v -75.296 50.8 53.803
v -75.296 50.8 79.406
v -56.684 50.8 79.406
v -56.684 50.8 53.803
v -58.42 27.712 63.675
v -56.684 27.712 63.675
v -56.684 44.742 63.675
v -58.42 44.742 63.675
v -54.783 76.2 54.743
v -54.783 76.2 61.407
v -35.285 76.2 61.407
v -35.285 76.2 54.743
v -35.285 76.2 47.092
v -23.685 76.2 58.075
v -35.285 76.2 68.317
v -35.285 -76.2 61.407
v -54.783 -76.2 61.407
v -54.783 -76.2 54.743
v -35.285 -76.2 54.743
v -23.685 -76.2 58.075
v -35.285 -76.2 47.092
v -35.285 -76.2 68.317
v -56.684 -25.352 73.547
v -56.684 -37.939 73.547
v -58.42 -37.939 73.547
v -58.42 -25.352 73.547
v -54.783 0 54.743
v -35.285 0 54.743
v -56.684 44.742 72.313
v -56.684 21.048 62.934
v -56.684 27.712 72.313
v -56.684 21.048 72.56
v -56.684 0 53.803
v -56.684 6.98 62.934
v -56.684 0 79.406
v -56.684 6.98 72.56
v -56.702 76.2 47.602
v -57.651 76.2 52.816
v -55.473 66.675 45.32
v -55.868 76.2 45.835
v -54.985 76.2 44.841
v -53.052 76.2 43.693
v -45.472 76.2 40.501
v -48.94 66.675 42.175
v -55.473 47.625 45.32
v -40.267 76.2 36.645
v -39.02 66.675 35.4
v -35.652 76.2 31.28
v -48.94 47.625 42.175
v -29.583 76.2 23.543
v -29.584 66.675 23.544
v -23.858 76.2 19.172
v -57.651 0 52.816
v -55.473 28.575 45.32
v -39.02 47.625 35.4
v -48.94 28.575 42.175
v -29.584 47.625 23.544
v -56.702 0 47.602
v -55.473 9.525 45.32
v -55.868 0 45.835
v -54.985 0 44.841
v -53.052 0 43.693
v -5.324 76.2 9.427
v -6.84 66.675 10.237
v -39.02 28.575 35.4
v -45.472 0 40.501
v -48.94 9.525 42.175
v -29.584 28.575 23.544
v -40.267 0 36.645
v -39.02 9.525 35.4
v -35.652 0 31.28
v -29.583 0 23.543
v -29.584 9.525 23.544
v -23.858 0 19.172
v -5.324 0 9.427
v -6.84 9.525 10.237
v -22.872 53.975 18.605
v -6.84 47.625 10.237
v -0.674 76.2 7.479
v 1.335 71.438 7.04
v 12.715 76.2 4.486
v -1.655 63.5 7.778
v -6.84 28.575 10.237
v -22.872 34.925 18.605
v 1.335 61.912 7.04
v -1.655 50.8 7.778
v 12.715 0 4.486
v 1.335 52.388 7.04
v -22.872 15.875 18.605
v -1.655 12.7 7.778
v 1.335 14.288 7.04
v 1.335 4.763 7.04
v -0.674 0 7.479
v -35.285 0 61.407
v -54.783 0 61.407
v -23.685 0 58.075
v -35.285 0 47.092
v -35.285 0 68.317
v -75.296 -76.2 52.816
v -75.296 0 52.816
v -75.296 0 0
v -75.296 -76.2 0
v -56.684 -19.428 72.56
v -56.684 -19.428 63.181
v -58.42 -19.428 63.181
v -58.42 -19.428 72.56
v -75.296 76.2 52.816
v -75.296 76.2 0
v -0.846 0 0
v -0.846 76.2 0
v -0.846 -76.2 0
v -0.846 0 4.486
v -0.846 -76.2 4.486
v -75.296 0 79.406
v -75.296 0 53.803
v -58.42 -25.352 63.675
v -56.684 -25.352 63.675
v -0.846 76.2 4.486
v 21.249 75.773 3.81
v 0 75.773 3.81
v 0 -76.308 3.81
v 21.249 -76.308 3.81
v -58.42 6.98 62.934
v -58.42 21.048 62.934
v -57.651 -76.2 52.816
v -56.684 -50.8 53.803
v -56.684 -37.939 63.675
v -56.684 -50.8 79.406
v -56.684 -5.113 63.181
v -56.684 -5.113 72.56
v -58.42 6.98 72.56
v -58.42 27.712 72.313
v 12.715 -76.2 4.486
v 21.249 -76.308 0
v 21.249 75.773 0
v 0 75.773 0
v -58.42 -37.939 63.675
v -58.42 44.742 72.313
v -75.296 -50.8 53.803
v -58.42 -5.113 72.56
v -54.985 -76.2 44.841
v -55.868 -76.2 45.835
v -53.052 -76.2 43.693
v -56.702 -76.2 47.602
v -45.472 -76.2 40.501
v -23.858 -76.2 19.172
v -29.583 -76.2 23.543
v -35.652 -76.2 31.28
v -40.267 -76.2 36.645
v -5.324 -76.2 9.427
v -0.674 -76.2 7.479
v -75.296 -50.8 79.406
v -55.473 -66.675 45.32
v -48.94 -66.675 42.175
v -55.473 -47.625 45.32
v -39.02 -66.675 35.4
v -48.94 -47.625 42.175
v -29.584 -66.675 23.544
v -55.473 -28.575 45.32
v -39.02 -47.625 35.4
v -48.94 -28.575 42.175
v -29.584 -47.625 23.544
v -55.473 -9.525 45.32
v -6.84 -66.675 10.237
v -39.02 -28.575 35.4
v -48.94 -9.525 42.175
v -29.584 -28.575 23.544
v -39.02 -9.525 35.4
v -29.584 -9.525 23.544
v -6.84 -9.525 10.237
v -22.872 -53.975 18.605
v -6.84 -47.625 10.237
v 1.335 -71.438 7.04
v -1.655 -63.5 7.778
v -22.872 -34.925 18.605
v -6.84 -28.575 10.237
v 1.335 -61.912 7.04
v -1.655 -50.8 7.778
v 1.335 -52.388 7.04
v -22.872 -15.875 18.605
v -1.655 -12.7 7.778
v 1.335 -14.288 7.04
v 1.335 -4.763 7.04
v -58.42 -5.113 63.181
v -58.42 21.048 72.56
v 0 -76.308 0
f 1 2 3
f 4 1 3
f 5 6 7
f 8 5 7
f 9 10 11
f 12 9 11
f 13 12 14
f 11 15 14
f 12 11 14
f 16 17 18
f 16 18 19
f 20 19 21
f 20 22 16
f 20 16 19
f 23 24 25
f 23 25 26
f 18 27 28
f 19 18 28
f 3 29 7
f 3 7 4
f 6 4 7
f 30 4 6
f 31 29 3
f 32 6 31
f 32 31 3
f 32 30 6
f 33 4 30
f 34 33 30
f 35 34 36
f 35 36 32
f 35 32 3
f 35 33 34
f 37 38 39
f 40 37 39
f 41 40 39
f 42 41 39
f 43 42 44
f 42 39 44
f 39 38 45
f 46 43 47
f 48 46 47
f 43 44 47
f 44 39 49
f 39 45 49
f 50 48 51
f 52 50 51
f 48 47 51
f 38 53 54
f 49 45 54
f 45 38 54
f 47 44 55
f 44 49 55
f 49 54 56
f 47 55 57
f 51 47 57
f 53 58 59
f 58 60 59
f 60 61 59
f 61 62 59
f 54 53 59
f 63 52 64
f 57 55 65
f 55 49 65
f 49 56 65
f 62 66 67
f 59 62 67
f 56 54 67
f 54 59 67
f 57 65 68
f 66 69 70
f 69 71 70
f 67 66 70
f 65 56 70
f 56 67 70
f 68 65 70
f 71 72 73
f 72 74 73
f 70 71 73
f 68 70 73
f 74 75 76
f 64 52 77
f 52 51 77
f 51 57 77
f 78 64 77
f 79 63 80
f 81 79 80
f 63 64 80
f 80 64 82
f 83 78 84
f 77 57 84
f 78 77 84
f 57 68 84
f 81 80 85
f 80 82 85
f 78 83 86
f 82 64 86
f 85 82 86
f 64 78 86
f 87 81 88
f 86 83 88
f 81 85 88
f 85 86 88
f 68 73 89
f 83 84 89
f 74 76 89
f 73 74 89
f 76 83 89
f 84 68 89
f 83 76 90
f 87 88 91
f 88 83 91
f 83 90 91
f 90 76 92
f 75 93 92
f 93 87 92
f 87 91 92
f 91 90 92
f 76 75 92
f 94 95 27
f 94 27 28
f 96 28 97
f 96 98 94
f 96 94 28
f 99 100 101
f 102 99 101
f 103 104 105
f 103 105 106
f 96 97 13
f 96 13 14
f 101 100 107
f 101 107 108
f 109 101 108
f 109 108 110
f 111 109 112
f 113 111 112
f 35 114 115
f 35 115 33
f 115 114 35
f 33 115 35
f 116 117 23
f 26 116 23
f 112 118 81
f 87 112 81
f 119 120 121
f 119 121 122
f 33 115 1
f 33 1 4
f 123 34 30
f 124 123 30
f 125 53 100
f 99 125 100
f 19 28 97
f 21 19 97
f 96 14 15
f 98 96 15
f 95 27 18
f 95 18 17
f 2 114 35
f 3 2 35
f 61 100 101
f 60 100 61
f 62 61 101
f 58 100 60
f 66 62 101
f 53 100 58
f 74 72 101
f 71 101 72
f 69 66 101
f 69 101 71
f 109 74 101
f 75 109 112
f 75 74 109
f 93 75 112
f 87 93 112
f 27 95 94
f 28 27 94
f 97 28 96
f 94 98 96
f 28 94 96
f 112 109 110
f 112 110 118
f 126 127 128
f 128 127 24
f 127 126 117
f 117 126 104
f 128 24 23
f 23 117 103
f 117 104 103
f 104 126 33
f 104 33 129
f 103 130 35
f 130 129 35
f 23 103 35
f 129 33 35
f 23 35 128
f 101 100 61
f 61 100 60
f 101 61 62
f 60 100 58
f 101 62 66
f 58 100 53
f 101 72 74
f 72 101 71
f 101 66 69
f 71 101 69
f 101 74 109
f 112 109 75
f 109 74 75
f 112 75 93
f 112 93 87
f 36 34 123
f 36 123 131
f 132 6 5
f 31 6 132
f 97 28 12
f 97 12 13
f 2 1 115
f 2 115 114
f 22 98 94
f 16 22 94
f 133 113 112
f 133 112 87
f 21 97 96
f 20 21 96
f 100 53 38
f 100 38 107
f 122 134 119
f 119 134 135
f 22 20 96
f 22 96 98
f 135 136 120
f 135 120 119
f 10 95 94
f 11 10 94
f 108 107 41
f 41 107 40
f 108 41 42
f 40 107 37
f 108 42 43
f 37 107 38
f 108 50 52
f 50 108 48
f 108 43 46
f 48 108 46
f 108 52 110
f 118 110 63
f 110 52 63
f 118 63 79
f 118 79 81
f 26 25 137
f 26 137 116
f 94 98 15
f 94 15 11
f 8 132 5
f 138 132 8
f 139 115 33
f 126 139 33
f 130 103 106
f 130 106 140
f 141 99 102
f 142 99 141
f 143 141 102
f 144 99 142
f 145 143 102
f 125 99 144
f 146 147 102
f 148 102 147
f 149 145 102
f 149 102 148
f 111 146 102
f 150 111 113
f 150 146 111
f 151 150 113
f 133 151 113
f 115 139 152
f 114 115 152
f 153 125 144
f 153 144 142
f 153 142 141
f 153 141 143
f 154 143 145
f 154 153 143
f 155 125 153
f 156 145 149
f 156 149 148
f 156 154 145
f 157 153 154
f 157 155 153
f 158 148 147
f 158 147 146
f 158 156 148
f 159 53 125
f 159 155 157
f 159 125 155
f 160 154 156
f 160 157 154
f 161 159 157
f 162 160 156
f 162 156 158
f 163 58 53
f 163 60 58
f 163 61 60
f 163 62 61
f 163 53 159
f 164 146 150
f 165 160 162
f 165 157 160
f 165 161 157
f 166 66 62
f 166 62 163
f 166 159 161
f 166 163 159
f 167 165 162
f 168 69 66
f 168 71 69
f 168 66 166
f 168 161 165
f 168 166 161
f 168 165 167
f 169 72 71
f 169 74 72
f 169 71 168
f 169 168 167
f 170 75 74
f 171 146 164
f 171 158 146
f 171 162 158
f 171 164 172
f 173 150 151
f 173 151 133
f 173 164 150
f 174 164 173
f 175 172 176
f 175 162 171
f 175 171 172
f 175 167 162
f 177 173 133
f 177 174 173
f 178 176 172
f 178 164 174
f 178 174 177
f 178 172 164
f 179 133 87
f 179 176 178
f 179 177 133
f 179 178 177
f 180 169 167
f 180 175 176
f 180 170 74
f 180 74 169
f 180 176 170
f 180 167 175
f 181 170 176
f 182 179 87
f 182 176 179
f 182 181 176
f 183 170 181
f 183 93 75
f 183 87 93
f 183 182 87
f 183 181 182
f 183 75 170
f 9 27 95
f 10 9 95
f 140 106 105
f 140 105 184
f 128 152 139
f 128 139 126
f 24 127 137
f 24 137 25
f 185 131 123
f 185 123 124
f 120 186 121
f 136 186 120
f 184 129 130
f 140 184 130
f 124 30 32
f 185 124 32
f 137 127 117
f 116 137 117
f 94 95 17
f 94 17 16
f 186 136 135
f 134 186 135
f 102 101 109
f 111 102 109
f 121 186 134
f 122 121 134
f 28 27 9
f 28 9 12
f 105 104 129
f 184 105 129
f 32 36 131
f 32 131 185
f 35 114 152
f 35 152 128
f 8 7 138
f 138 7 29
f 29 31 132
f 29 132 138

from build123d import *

# Parameters (mm, degrees)
F0_W     = 21.2485753
F0_H     = 152.0810052752
F1_DEPTH = 3.81
F3_DEPTH = 76.2
F2_W     = 19.4977223873
F2_H     = 6.6637769341
F4_DEPTH = 76.2
F5_W     = 18.6125934124
F5_H     = 25.6022065878
F6_DEPTH = 50.8
F7_DEPTH = 50.8
F8_W     = 14.3147837371
F8_H     = 9.378656745
F8_W_2   = 14.0679730102
F8_H_2   = 9.6254572272
F8_W_3   = 12.587139383
F8_H_3   = 9.8722651601
F8_W_4   = 17.029652372
F8_H_4   = 8.6382329464
F9_DEPTH = 58.42


with BuildPart() as f1:
    # F0 (on Top) → F1 (new body)
    with BuildSketch(Plane.XY):
        with Locations((10.62428765, -0.267278403)):
            Rectangle(F0_W, F0_H)
    extrude(amount=F1_DEPTH)


with BuildPart() as f3:
    # F2 (on Front) → F3 (new body)
    with BuildSketch(Plane.XZ):
        with BuildLine():
            Line((-57.6507113874, 52.8162680566), (-75.2964168787, 52.8162680566))
            Line((-75.2964168787, 52.8162680566), (-75.2964168787, 0))
            Line((-75.2964168787, 0), (-0.846029463, 0))
            Line((-0.846029463, 0), (-0.846029463, 4.4855900342))
            Line((-0.846029463, 4.4855900342), (0, 4.4855900342))
            Line((0, 4.4855900342), (12.7145235892, 4.4855900342))
            add(Edge.make_bspline(
                [(-57.6507113874, 52.8162680566), (-57.3076574479, 49.9294208495), (-56.6267364551, 44.1968150065), (-48.3342084307, 42.576740226), (-38.0818843322, 36.1305714757), (-30.3544979342, 22.4931937459), (-19.7634057619, 16.912441387), (-6.7248199885, 10.2621660981), (-0.3365370443, 6.6140396), (8.4946691957, 6.3613474044), (12.7145235892, 4.4855900342)],
                knots=[0, 0, 0, 0, 0.1056642831, 0.2074992162, 0.338577851, 0.4857937218, 0.6179620961, 0.7603575547, 0.8635138744, 1, 1, 1, 1], degree=3))
        make_face()
    extrude(amount=F3_DEPTH)


with BuildPart() as f3b:
    # F2 (on Front) → F3, piece 2 (new body)
    with BuildSketch(Plane.XZ):
        with Locations((-45.0337249786, 58.0747127533)):
            Rectangle(F2_W, F2_H)
        Polygon((-35.2848637849, 68.3171860874), (-35.2848637849, 61.4066012204), (-35.2848637849, 54.7428242862), (-35.2848637849, 47.091819346), (-23.6849524081, 58.0747127533), align=None)
    extrude(amount=F3_DEPTH)


with BuildPart() as f4:
    # F4 (new): a face of the model
    f4_faces = [f3.part.faces().sort_by_distance(p)[0] for p in [
        (-48.0221712307, 0, 19.9820449464),
    ]]
    extrude(f4_faces, amount=F4_DEPTH)


with BuildPart() as f4b:
    # F4#2 (new): a face of the model
    f4_2_faces = [f3b.part.faces().sort_by_distance(p)[0] for p in [
        (-38.4095254278, 0, 57.954636592),
    ]]
    extrude(f4_2_faces, amount=F4_DEPTH)


with BuildPart() as f6:
    # F5 (on Front) → F6 (new body)
    with BuildSketch(Plane.XZ):
        with Locations((-65.9901201725, 66.6045919061)):
            Rectangle(F5_W, F5_H)
    extrude(amount=F6_DEPTH)


with BuildPart() as f7:
    # F7 (new): a face of the model
    f7_faces = [f6.part.faces().sort_by_distance(p)[0] for p in [
        (-65.9901201725, 0, 66.6045919061),
    ]]
    extrude(f7_faces, amount=F7_DEPTH)


with BuildPart() as f9_tool:
    # F8 (on Right) → F9 (new body)
    with BuildSketch(Plane.YZ):
        with Locations((-12.2708184645, 67.8704231977)):
            Rectangle(F8_W, F8_H)
        with Locations((14.0140862204, 67.7470229566)):
            Rectangle(F8_W_2, F8_H_2)
        with Locations((-31.6451368853, 68.610843271)):
            Rectangle(F8_W_3, F8_H_3)
        with Locations((36.2266814336, 67.9938271642)):
            Rectangle(F8_W_4, F8_H_4)
    extrude(amount=-F9_DEPTH)


with BuildPart() as f6_1:
    add(f6.part)

    # F9: cut by f9_tool
    add(f9_tool.part, mode=Mode.SUBTRACT)


with BuildPart() as f7_1:
    add(f7.part)

    # F9: cut by f9_tool
    add(f9_tool.part, mode=Mode.SUBTRACT)


solid = Compound([f1.part, f3.part, f3b.part, f4.part, f4b.part, f6_1.part, f7_1.part])
